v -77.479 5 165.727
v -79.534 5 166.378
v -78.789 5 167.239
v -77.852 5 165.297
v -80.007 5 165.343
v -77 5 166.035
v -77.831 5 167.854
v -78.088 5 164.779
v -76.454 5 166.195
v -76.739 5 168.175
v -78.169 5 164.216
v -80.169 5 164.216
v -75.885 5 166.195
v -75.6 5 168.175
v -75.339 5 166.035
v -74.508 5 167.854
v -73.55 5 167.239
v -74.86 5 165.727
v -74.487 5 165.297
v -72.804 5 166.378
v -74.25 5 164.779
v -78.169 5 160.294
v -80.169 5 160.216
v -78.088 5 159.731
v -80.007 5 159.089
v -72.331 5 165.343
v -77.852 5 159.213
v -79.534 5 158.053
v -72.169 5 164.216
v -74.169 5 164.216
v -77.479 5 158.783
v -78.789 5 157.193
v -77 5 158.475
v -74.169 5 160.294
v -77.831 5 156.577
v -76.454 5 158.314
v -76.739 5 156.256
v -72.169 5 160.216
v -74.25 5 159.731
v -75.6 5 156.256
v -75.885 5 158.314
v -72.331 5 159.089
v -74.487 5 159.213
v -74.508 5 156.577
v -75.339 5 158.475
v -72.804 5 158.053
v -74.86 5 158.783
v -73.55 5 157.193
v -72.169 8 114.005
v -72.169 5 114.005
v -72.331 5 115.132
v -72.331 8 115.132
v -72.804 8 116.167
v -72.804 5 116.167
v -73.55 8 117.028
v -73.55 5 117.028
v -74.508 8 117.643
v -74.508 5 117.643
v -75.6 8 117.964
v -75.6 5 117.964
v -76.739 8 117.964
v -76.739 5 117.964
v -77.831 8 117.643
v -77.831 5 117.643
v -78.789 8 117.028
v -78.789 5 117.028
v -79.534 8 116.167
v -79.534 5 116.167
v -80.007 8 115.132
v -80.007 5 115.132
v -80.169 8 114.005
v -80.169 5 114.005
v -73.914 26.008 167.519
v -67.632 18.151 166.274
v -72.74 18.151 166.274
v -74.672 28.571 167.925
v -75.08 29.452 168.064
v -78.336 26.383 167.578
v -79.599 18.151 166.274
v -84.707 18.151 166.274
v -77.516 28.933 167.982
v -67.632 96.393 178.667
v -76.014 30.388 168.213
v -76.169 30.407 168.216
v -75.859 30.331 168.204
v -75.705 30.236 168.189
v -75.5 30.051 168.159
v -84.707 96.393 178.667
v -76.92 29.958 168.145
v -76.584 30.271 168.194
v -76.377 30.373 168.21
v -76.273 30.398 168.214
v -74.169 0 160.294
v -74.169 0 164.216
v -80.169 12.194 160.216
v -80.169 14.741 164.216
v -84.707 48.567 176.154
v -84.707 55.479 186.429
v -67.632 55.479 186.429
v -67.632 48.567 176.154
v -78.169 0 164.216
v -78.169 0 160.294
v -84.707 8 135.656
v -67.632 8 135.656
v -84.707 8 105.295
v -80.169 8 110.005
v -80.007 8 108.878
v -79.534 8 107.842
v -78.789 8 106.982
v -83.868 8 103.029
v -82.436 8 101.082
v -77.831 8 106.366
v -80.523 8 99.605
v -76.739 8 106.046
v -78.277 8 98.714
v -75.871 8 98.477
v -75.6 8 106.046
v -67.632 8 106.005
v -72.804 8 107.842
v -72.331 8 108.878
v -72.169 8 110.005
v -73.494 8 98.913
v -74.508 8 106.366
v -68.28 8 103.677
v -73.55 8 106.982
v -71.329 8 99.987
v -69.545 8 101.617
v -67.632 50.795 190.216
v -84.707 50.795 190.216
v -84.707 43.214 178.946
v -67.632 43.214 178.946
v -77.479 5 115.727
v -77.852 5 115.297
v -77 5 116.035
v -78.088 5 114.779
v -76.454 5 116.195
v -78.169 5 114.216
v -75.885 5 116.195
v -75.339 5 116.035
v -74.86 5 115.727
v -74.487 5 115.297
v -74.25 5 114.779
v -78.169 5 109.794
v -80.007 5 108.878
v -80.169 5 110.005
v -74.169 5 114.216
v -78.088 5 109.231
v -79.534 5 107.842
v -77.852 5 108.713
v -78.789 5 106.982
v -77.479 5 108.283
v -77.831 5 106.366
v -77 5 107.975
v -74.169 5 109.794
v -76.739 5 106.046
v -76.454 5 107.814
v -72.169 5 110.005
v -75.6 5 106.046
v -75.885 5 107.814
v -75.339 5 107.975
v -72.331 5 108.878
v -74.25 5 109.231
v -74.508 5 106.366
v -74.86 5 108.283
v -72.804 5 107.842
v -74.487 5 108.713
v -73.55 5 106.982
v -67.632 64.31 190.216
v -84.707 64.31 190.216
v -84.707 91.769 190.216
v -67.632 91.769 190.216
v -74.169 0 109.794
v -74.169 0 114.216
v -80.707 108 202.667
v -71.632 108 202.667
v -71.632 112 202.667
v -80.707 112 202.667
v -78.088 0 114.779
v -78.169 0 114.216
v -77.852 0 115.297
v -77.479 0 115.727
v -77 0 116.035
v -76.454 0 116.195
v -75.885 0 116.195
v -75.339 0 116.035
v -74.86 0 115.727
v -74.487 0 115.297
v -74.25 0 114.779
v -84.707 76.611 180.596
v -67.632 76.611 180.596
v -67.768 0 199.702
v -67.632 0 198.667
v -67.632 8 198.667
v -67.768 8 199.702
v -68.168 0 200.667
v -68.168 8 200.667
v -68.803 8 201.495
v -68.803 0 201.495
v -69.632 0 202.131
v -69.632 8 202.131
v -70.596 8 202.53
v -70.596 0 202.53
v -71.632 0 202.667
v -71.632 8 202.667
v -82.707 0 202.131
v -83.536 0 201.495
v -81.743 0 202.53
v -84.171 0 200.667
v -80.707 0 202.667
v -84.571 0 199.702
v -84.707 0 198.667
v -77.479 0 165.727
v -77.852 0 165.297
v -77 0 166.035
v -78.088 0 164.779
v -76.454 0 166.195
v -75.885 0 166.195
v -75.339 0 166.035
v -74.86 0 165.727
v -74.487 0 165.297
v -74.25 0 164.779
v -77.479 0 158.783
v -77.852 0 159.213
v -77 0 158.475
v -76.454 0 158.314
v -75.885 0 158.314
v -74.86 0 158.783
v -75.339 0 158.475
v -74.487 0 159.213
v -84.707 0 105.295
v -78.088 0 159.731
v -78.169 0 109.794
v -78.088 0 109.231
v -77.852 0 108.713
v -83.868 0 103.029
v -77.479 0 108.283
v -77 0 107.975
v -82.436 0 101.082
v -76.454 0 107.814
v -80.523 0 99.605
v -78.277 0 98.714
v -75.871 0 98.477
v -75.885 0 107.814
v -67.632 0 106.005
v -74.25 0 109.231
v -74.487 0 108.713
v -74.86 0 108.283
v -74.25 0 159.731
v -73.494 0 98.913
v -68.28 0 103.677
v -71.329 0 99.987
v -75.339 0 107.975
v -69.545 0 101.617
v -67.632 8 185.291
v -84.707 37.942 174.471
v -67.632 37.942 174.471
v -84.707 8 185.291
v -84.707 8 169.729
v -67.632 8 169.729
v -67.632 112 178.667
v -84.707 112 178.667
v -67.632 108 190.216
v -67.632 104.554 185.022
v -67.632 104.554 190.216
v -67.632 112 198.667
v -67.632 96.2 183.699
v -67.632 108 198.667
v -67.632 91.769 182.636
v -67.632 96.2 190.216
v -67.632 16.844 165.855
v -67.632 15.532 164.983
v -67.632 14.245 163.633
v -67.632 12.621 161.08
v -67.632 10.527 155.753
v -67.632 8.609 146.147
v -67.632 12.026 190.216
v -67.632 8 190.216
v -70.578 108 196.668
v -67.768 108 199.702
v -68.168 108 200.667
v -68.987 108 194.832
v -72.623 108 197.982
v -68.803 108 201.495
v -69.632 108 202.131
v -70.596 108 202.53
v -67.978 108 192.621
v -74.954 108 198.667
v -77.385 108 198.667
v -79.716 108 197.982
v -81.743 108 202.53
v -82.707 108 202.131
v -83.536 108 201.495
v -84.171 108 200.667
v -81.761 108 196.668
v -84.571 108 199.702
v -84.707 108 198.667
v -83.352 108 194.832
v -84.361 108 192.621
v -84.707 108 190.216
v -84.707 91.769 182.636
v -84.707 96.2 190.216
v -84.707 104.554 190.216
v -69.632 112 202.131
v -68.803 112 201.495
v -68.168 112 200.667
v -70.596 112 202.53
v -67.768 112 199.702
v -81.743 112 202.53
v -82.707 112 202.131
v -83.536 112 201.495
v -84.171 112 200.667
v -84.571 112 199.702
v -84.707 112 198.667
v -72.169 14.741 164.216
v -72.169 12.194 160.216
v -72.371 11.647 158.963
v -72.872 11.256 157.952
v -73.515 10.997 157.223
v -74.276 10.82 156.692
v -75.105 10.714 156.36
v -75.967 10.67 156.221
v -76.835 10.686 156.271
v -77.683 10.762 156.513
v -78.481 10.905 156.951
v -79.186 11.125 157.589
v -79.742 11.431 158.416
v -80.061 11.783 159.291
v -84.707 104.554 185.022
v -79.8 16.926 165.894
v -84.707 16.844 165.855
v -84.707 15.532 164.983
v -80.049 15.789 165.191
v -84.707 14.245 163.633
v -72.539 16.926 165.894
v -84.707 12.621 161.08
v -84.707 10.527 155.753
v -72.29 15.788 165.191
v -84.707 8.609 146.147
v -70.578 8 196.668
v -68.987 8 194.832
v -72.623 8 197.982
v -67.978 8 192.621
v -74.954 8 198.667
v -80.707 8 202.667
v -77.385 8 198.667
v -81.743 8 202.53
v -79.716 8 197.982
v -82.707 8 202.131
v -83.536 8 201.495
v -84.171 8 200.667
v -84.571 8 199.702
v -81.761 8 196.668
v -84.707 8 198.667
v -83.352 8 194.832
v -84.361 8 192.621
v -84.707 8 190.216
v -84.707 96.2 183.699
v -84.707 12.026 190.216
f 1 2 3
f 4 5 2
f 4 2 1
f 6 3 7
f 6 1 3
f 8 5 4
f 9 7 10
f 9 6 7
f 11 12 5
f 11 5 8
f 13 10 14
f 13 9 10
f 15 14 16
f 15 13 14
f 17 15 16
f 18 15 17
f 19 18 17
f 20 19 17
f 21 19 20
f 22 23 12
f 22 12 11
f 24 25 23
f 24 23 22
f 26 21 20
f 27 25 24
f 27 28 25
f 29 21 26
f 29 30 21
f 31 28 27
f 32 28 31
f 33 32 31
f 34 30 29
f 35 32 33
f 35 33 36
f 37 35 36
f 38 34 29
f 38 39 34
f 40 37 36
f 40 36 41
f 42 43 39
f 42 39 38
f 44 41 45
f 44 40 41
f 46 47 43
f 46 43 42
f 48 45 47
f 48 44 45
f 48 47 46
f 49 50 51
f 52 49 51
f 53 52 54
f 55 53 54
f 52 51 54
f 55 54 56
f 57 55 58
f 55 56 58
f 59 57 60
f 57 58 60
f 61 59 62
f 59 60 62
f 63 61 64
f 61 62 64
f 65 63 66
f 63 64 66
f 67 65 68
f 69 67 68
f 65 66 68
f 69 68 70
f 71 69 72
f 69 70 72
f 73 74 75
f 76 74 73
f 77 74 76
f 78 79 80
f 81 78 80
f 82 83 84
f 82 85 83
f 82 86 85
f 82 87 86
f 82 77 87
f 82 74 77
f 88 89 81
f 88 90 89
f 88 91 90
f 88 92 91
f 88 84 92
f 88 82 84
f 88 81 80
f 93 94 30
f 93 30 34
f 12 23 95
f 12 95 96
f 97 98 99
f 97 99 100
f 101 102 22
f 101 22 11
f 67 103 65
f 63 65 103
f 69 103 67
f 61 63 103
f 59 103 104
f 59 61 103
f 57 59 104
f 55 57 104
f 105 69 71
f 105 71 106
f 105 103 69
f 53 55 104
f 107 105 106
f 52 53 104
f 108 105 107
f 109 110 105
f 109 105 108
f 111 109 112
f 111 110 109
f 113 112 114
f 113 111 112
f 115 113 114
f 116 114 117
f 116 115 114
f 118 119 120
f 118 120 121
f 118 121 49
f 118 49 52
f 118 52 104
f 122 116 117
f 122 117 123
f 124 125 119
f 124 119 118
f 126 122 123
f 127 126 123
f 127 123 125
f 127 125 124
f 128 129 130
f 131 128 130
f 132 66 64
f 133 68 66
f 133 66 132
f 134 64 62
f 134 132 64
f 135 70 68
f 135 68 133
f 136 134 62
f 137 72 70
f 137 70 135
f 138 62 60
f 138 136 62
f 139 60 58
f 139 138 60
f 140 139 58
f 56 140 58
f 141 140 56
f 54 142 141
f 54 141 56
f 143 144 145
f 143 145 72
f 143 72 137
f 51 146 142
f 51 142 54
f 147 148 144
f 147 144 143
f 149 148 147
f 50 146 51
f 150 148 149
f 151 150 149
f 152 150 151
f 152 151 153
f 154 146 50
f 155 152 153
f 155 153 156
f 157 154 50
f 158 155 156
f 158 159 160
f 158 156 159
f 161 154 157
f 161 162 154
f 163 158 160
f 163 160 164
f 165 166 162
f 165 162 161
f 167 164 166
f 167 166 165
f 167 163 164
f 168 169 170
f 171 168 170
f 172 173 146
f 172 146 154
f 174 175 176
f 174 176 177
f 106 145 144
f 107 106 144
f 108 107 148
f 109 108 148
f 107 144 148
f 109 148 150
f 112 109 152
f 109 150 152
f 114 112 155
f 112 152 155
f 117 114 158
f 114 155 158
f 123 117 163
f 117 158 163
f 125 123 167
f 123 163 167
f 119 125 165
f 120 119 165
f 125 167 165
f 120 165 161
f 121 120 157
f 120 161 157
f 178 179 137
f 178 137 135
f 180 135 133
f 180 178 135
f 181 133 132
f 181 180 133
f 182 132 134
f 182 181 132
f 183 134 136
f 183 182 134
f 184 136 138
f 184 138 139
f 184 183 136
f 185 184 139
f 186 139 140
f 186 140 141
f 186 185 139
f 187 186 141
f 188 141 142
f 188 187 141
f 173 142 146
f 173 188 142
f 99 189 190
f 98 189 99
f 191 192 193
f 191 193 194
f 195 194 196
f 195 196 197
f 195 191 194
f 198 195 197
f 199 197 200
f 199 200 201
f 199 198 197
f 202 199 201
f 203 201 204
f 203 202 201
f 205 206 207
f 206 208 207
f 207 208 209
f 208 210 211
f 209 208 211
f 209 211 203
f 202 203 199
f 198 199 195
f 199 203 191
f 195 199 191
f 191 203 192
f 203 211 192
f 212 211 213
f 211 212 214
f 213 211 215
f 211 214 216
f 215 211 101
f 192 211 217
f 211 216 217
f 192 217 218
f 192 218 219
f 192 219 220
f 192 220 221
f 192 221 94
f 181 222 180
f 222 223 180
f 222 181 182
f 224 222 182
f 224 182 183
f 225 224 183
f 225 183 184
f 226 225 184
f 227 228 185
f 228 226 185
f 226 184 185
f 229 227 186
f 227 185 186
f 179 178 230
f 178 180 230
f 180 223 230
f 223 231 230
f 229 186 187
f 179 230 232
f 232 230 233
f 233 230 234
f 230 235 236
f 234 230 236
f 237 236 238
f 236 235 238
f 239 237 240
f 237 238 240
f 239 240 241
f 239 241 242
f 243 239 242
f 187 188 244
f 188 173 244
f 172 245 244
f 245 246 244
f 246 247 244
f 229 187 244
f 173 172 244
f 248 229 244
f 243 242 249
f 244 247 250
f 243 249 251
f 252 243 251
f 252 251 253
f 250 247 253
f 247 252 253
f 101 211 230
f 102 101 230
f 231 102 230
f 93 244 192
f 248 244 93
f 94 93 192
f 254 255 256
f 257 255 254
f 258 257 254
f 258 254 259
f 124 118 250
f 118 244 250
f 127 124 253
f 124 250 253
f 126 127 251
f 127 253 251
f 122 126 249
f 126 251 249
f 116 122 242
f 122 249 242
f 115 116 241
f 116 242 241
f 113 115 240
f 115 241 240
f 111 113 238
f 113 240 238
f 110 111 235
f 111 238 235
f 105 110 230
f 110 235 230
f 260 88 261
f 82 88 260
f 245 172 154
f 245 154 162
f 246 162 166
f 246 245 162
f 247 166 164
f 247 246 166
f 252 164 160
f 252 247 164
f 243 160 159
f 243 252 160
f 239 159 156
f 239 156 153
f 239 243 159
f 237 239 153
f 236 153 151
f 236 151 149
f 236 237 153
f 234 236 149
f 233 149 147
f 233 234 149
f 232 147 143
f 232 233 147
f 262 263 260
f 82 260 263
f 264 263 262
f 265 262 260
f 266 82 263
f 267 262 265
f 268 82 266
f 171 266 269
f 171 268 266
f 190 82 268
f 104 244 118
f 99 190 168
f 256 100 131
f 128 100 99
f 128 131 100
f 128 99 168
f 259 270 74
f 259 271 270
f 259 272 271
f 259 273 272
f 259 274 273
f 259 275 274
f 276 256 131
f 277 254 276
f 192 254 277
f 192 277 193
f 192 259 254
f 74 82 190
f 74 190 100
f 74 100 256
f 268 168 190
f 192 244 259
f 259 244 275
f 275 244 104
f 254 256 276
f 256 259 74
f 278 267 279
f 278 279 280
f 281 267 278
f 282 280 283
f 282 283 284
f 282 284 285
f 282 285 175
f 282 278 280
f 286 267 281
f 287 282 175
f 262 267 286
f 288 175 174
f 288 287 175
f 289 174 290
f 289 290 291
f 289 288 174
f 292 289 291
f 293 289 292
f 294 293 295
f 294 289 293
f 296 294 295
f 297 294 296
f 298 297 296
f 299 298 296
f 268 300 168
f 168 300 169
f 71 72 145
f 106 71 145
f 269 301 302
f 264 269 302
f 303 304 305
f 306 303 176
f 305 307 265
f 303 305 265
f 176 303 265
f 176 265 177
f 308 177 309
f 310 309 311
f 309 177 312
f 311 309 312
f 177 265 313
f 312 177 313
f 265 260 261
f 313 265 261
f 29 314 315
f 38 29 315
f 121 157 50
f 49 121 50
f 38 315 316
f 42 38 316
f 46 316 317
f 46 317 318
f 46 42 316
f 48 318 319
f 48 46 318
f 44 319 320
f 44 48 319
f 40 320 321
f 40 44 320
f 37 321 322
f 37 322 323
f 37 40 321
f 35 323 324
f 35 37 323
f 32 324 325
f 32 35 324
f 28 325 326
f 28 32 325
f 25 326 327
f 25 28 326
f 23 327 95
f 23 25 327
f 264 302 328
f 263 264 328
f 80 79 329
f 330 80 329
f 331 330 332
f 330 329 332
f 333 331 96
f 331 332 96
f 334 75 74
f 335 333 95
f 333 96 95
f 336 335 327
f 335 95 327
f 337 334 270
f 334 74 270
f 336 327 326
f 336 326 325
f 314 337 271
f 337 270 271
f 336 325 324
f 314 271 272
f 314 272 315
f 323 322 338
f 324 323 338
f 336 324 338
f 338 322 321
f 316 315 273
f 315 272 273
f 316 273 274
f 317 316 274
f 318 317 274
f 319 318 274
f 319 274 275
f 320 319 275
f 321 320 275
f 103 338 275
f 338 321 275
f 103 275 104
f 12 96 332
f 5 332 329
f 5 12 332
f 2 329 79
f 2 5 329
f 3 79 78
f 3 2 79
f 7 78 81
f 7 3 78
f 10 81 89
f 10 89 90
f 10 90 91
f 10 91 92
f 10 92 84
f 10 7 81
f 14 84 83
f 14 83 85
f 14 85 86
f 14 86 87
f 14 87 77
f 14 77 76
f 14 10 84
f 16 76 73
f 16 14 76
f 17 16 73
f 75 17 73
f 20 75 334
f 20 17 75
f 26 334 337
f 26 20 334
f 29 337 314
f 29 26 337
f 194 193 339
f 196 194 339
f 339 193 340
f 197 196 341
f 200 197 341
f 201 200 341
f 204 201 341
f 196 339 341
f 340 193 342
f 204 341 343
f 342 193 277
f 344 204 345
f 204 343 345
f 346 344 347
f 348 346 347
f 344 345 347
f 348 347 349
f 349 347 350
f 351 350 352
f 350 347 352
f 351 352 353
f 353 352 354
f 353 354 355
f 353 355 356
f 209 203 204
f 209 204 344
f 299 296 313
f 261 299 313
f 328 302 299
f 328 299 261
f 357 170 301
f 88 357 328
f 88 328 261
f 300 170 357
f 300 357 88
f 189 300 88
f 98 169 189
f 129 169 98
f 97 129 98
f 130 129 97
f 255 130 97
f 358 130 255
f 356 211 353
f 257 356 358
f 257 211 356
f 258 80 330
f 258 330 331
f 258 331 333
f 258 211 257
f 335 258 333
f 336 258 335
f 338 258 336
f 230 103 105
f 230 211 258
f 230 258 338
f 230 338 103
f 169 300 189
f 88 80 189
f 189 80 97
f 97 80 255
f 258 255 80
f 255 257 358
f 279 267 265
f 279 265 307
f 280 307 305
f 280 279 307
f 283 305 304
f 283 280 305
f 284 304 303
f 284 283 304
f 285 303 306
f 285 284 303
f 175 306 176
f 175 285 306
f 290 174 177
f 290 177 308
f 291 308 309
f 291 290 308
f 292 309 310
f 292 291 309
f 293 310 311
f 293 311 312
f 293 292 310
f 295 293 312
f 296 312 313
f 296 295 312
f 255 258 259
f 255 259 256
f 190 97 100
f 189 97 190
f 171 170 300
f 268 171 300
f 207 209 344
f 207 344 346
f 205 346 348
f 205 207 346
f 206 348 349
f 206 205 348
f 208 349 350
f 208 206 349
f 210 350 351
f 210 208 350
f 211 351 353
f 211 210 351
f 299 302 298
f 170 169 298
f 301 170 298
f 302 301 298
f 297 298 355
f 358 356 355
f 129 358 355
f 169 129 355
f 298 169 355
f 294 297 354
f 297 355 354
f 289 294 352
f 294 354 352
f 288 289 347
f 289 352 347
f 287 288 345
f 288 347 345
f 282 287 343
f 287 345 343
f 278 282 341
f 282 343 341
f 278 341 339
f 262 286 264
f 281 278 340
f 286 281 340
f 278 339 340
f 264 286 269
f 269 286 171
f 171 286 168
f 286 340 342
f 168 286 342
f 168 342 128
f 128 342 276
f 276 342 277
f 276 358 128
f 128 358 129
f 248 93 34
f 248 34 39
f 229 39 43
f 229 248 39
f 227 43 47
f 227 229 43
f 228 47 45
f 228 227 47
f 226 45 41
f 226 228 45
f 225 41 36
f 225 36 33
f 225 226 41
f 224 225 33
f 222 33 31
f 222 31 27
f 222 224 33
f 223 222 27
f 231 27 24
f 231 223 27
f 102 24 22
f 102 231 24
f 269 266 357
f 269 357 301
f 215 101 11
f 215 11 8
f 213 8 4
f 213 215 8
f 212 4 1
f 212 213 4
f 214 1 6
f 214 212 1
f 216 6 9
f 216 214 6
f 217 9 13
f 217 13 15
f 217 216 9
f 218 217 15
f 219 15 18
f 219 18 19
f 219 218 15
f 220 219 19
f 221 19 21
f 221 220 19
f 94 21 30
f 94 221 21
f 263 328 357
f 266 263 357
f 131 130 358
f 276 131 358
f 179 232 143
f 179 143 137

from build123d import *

# Parameters (mm, degrees)
BOSS_EXTRUDE1_DEPTH = 5
BOSS_EXTRUDE2_START = 5
BOSS_EXTRUDE2_DEPTH = 3
BOSS_EXTRUDE3_START = 8
BOSS_EXTRUDE3_DEPTH = 100
CHAMFER1_SIZE       = 14
CHAMFER1_SIZE2      = 88.392521205
CUT_EXTRUDE1_REACH  = 228.845
CUT_EXTRUDE2_REACH  = 243.541
CUT_EXTRUDE3_START  = 5
CUT_EXTRUDE3_DEPTH  = 25.406962
BOSS_EXTRUDE4_DEPTH = 4
BOSS_EXTRUDE5_START = -108
BOSS_EXTRUDE5_DEPTH = 8


with BuildPart() as part:
    # Sketch1 → Boss-Extrude1 (new body)
    # profile 1 of 5: a face of its own
    with BuildSketch(Plane(origin=(0, 0, 0), x_dir=(1, 0, 0), z_dir=(0, 1, 0))):
        with BuildLine():
            Line((-67.63171498, -190.215666308), (-67.63171498, -178.666752182))
            Line((-67.63171498, -178.666752182), (-84.707225068, -178.666752182))
            Line((-84.707225068, -178.666752182), (-84.707225068, -190.215666308))
            ThreePointArc((-84.707225068, -190.215666308), (-76.169470024, -198.753421352), (-67.63171498, -190.215666308))
        make_face()
    # profile 2 of 5: a face of its own
    with BuildSketch(Plane(origin=(0, 0, 0), x_dir=(1, 0, 0), z_dir=(0, 1, 0))):
        with BuildLine():
            Line((-84.707225068, -178.666752182), (-67.63171498, -178.666752182))
            Line((-67.63171498, -178.666752182), (-67.63171498, -106.004837653))
            ThreePointArc((-67.63171498, -106.004837653), (-75.871331662, -98.476802493), (-84.707225068, -105.29512957))
            Line((-84.707225068, -105.29512957), (-84.707225068, -178.666752182))
        make_face()
        with BuildLine():
            ThreePointArc((-80.169470024, -160.215666308), (-76.169470024, -156.215666308), (-72.169470024, -160.215666308))
            Line((-72.169470024, -160.215666308), (-72.169470024, -164.215666308))
            ThreePointArc((-72.169470024, -164.215666308), (-76.169470024, -168.215666308), (-80.169470024, -164.215666308))
            Line((-80.169470024, -164.215666308), (-80.169470024, -160.215666308))
        make_face(mode=Mode.SUBTRACT)
        with BuildLine():
            ThreePointArc((-80.169470024, -110.004837653), (-76.169470024, -106.004837653), (-72.169470024, -110.004837653))
            Line((-72.169470024, -110.004837653), (-72.169470024, -114.004837653))
            ThreePointArc((-72.169470024, -114.004837653), (-76.169470024, -118.004837653), (-80.169470024, -114.004837653))
            Line((-80.169470024, -114.004837653), (-80.169470024, -110.004837653))
        make_face(mode=Mode.SUBTRACT)
    # profile 3 of 5: a face of its own
    with BuildSketch(Plane(origin=(0, 0, 0), x_dir=(1, 0, 0), z_dir=(0, 1, 0))):
        with BuildLine():
            Line((-80.169470024, -160.215666308), (-80.169470024, -164.215666308))
            ThreePointArc((-80.169470024, -164.215666308), (-76.169470024, -168.215666308), (-72.169470024, -164.215666308))
            Line((-72.169470024, -164.215666308), (-72.169470024, -160.215666308))
            ThreePointArc((-72.169470024, -160.215666308), (-76.169470024, -156.215666308), (-80.169470024, -160.215666308))
        make_face()
        with BuildLine():
            ThreePointArc((-74.169470024, -160.294008998), (-76.169470024, -158.294008998), (-78.169470024, -160.294008998))
            Line((-78.169470024, -160.294008998), (-78.169470024, -164.215666308))
            ThreePointArc((-78.169470024, -164.215666308), (-76.169470024, -166.215666308), (-74.169470024, -164.215666308))
            Line((-74.169470024, -164.215666308), (-74.169470024, -160.294008998))
        make_face(mode=Mode.SUBTRACT)
    # profile 4 of 5: a face of its own
    with BuildSketch(Plane(origin=(0, 0, 0), x_dir=(1, 0, 0), z_dir=(0, 1, 0))):
        with BuildLine():
            Line((-80.169470024, -110.004837653), (-80.169470024, -114.004837653))
            ThreePointArc((-80.169470024, -114.004837653), (-76.169470024, -118.004837653), (-72.169470024, -114.004837653))
            Line((-72.169470024, -114.004837653), (-72.169470024, -110.004837653))
            ThreePointArc((-72.169470024, -110.004837653), (-76.169470024, -106.004837653), (-80.169470024, -110.004837653))
        make_face()
        with BuildLine():
            ThreePointArc((-74.169470024, -109.794008998), (-76.169470024, -107.794008998), (-78.169470024, -109.794008998))
            Line((-78.169470024, -109.794008998), (-78.169470024, -114.215666308))
            ThreePointArc((-78.169470024, -114.215666308), (-76.169470024, -116.215666308), (-74.169470024, -114.215666308))
            Line((-74.169470024, -114.215666308), (-74.169470024, -109.794008998))
        make_face(mode=Mode.SUBTRACT)
    # profile 5 of 5: a face of its own
    with BuildSketch(Plane(origin=(0, 0, 0), x_dir=(1, 0, 0), z_dir=(0, 1, 0))):
        with BuildLine():
            Line((-74.169470024, -164.215666308), (-74.169470024, -160.294008998))
            ThreePointArc((-74.169470024, -160.294008998), (-76.169470024, -158.294008998), (-78.169470024, -160.294008998))
            Line((-78.169470024, -160.294008998), (-78.169470024, -164.215666308))
            ThreePointArc((-78.169470024, -164.215666308), (-76.169470024, -166.215666308), (-74.169470024, -164.215666308))
        make_face()
    extrude(amount=BOSS_EXTRUDE1_DEPTH)

    # Sketch1<3> → Boss-Extrude2 (add)
    with BuildSketch(Plane(origin=(0, 0, 0), x_dir=(1, 0, 0), z_dir=(0, 1, 0)).offset(BOSS_EXTRUDE2_START)):
        with BuildLine():
            Line((-67.63171498, -190.215666308), (-67.63171498, -106.004837653))
            ThreePointArc((-67.63171498, -106.004837653), (-75.871331662, -98.476802493), (-84.707225068, -105.29512957))
            Line((-84.707225068, -105.29512957), (-84.707225068, -190.215666308))
            ThreePointArc((-84.707225068, -190.215666308), (-76.169470024, -198.753421352), (-67.63171498, -190.215666308))
        make_face()
        with BuildLine():
            Line((-72.169470024, -110.004837653), (-72.169470024, -114.004837653))
            ThreePointArc((-72.169470024, -114.004837653), (-76.169470024, -118.004837653), (-80.169470024, -114.004837653))
            Line((-80.169470024, -114.004837653), (-80.169470024, -110.004837653))
            ThreePointArc((-80.169470024, -110.004837653), (-76.169470024, -106.004837653), (-72.169470024, -110.004837653))
        make_face(mode=Mode.SUBTRACT)
    extrude(amount=BOSS_EXTRUDE2_DEPTH)

    # Sketch1<4> → Boss-Extrude3 (add)
    with BuildSketch(Plane(origin=(0, 0, 0), x_dir=(1, 0, 0), z_dir=(0, 1, 0)).offset(BOSS_EXTRUDE3_START)):
        with BuildLine():
            Line((-67.63171498, -190.215666308), (-67.63171498, -178.666752182))
            Line((-67.63171498, -178.666752182), (-84.707225068, -178.666752182))
            Line((-84.707225068, -178.666752182), (-84.707225068, -190.215666308))
            ThreePointArc((-84.707225068, -190.215666308), (-76.169470024, -198.753421352), (-67.63171498, -190.215666308))
        make_face()
    extrude(amount=BOSS_EXTRUDE3_DEPTH)

    # Chamfer1
    chamfer1_edges = [part.edges().sort_by_distance(p)[0] for p in [
        (-76.169470024, 8, 178.666752182),
    ]]
    chamfer1_side = [part.faces().sort_by_distance(p)[0] for p in [
        (-76.174011802, 8, 141.227226291),
    ]]
    chamfer(chamfer1_edges, length=CHAMFER1_SIZE, length2=CHAMFER1_SIZE2, reference=chamfer1_side[0])

    # Fillet1
    # an asymmetric fillet: 31, 15 mm, written as the material it adds along each edge
    with BuildSketch(Plane(origin=(-67.63171498, 8, 164.666752182), x_dir=(0, 0.9876883405951381, 0.15643446504022812), z_dir=(-1, 0, 0))) as fillet1_piece_1:
        with BuildLine():
            Bezier((10.277059237, 0), (0, 0), (-4.538265872, 28.653483024), weights=[1, 0.760405966, 1])
            Line((-4.538265872, 28.653483024), (0, 0))
            Line((0, 0), (10.277059237, 0))
        make_face()
    extrude(amount=17.075510088)

    # Sketch2 → Cut-Extrude1 (cut, up to next)
    with BuildSketch(Plane.ZY.offset(84.707225068), mode=Mode.PRIVATE) as cut_extrude1_sk1:
        Polygon((190.215666308, 91.769109668), (182.636112577, 91.769109668), (190.215666308, 64.31043598), align=None)
    cut_extrude1_tool1 = extrude(cut_extrude1_sk1.sketch, amount=-CUT_EXTRUDE1_REACH, mode=Mode.PRIVATE) & part.part
    # Sketch2 → Cut-Extrude1 (cut, up to next)
    with BuildSketch(Plane.ZY.offset(84.707225068), mode=Mode.PRIVATE) as cut_extrude1_sk2:
        Polygon((176.154286922, 48.567173756), (180.595955478, 76.61076533), (186.42899162, 55.479252617), align=None)
    cut_extrude1_tool2 = extrude(cut_extrude1_sk2.sketch, amount=-CUT_EXTRUDE1_REACH, mode=Mode.PRIVATE) & part.part
    # Sketch2 → Cut-Extrude1 (cut, up to next)
    with BuildSketch(Plane.ZY.offset(84.707225068), mode=Mode.PRIVATE) as cut_extrude1_sk3:
        Polygon((190.215666308, 12.025794409), (190.215666308, 50.795315392), (178.946314561, 43.21410987), align=None)
    cut_extrude1_tool3 = extrude(cut_extrude1_sk3.sketch, amount=-CUT_EXTRUDE1_REACH, mode=Mode.PRIVATE) & part.part
    # Sketch2 → Cut-Extrude1 (cut, up to next)
    with BuildSketch(Plane.ZY.offset(84.707225068), mode=Mode.PRIVATE) as cut_extrude1_sk4:
        Polygon((174.47148672, 37.942391428), (185.290645631, 8), (169.729077811, 8), align=None)
    cut_extrude1_tool4 = extrude(cut_extrude1_sk4.sketch, amount=-CUT_EXTRUDE1_REACH, mode=Mode.PRIVATE) & part.part
    # Sketch2 → Cut-Extrude1 (cut, up to next)
    with BuildSketch(Plane.ZY.offset(84.707225068), mode=Mode.PRIVATE) as cut_extrude1_sk5:
        Polygon((185.02175896, 104.554188767), (183.698567215, 96.199884882), (190.215666308, 96.199884882), (190.215666308, 104.554188767), align=None)
    cut_extrude1_tool5 = extrude(cut_extrude1_sk5.sketch, amount=-CUT_EXTRUDE1_REACH, mode=Mode.PRIVATE) & part.part
    add(cut_extrude1_tool1.solids().sort_by_distance((-84.707225, 82.616218, 187.689148))[0], mode=Mode.SUBTRACT)
    add(cut_extrude1_tool2.solids().sort_by_distance((-84.707225, 60.219064, 181.059745))[0], mode=Mode.SUBTRACT)
    add(cut_extrude1_tool3.solids().sort_by_distance((-84.707225, 35.345073, 186.459216))[0], mode=Mode.SUBTRACT)
    add(cut_extrude1_tool4.solids().sort_by_distance((-84.707225, 17.980797, 176.49707))[0], mode=Mode.SUBTRACT)
    add(cut_extrude1_tool5.solids().sort_by_distance((-84.707225, 100.219716, 187.275456))[0], mode=Mode.SUBTRACT)

    # Sketch1<5> → Cut-Extrude2 (cut, up to next)
    with BuildSketch(Plane(origin=(0, 0, 0), x_dir=(1, 0, 0), z_dir=(0, 1, 0)), mode=Mode.PRIVATE) as cut_extrude2_sk1:
        with BuildLine():
            Line((-74.169470024, -164.215666308), (-74.169470024, -160.294008998))
            ThreePointArc((-74.169470024, -160.294008998), (-76.169470024, -158.294008998), (-78.169470024, -160.294008998))
            Line((-78.169470024, -160.294008998), (-78.169470024, -164.215666308))
            ThreePointArc((-78.169470024, -164.215666308), (-76.169470024, -166.215666308), (-74.169470024, -164.215666308))
        make_face()
    cut_extrude2_tool1 = extrude(cut_extrude2_sk1.sketch, amount=CUT_EXTRUDE2_REACH, mode=Mode.PRIVATE) & part.part
    add(cut_extrude2_tool1.solids().sort_by_distance((-76.16947, 0, 162.254838))[0], mode=Mode.SUBTRACT)

    # Sketch1<6> → Cut-Extrude3 (cut)
    with BuildSketch(Plane(origin=(0, 0, 0), x_dir=(1, 0, 0), z_dir=(0, 1, 0)).offset(CUT_EXTRUDE3_START)):
        with BuildLine():
            Line((-80.169470024, -160.215666308), (-80.169470024, -164.215666308))
            ThreePointArc((-80.169470024, -164.215666308), (-76.169470024, -168.215666308), (-72.169470024, -164.215666308))
            Line((-72.169470024, -164.215666308), (-72.169470024, -160.215666308))
            ThreePointArc((-72.169470024, -160.215666308), (-76.169470024, -156.215666308), (-80.169470024, -160.215666308))
        make_face()
        with BuildLine():
            ThreePointArc((-74.169470024, -160.294008998), (-76.169470024, -158.294008998), (-78.169470024, -160.294008998))
            Line((-78.169470024, -160.294008998), (-78.169470024, -164.215666308))
            ThreePointArc((-78.169470024, -164.215666308), (-76.169470024, -166.215666308), (-74.169470024, -164.215666308))
            Line((-74.169470024, -164.215666308), (-74.169470024, -160.294008998))
        make_face(mode=Mode.SUBTRACT)
    extrude(amount=CUT_EXTRUDE3_DEPTH, mode=Mode.SUBTRACT)

    # Sketch4 → Boss-Extrude4 (add)
    with BuildSketch(Plane(origin=(0, 108, 0), x_dir=(1, 0, 0), z_dir=(0, 1, 0))):
        with BuildLine():
            Line((-67.63171498, -178.666752182), (-67.63171498, -198.666752182))
            ThreePointArc((-67.63171498, -198.666752182), (-68.803287856, -201.495179307), (-71.63171498, -202.666752182))
            Line((-71.63171498, -202.666752182), (-80.707225068, -202.666752182))
            ThreePointArc((-80.707225068, -202.666752182), (-83.535652193, -201.495179307), (-84.707225068, -198.666752182))
            Line((-84.707225068, -198.666752182), (-84.707225068, -178.666752182))
            Line((-84.707225068, -178.666752182), (-67.63171498, -178.666752182))
        make_face()
    extrude(amount=BOSS_EXTRUDE4_DEPTH)

    # Sketch4<2> → Boss-Extrude5 (add)
    with BuildSketch(Plane(origin=(0, 108, 0), x_dir=(1, 0, 0), z_dir=(0, 1, 0)).offset(BOSS_EXTRUDE5_START)):
        with BuildLine():
            Line((-67.63171498, -178.666752182), (-67.63171498, -198.666752182))
            ThreePointArc((-67.63171498, -198.666752182), (-68.803287856, -201.495179307), (-71.63171498, -202.666752182))
            Line((-71.63171498, -202.666752182), (-80.707225068, -202.666752182))
            ThreePointArc((-80.707225068, -202.666752182), (-83.535652193, -201.495179307), (-84.707225068, -198.666752182))
            Line((-84.707225068, -198.666752182), (-84.707225068, -178.666752182))
            Line((-84.707225068, -178.666752182), (-67.63171498, -178.666752182))
        make_face()
    extrude(amount=BOSS_EXTRUDE5_DEPTH)


solid = part.part
